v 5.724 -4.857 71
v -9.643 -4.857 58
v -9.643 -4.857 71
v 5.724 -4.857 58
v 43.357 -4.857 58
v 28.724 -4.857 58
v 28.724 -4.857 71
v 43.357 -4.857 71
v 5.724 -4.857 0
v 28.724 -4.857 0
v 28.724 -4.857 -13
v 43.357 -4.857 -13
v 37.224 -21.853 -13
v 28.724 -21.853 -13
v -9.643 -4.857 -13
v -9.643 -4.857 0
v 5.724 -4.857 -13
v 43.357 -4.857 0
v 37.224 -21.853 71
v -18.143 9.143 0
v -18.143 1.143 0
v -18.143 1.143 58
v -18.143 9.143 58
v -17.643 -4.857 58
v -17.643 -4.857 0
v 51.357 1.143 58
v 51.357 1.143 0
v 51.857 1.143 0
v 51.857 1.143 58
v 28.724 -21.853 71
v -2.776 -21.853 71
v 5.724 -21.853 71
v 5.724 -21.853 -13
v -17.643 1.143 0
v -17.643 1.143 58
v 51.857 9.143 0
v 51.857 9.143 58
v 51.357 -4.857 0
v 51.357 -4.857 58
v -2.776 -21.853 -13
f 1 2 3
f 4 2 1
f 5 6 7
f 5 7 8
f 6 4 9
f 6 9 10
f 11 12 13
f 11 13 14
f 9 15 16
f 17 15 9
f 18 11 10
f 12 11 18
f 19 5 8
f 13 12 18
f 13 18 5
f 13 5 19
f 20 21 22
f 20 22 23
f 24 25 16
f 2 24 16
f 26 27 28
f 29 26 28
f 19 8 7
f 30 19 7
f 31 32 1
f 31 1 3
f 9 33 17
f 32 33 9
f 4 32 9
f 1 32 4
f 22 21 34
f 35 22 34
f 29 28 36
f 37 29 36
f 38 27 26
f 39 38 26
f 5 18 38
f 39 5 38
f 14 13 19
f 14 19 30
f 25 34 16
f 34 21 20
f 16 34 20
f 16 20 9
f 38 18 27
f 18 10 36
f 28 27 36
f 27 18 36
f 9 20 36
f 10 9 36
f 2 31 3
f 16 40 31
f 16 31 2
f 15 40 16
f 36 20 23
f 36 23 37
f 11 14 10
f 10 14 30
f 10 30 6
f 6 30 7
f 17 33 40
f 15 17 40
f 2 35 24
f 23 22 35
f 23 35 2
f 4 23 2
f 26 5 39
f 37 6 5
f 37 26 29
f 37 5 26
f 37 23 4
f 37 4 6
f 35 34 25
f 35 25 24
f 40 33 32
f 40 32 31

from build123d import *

# Parameters (mm, degrees)
SKETCH_1_W           = 70
SKETCH_1_H           = 8
EXTRUDE_1_DEPTH      = 58
SKETCH_2_W           = 69
SKETCH_2_H           = 58
EXTRUDE_2_DEPTH      = 6
EXTRUDE_3_DEPTH      = 71
EXTRUDE_3_DEPTH_BACK = 13
CUT_EXTRUDE_2_REACH  = 103.107
SKETCH_6_W           = 23
SKETCH_6_H           = 16.995926687


with BuildPart() as part:
    # 草图1 → 凸台-拉伸1 (new body)
    with BuildSketch(Plane.XY):
        with Locations((16.857142857, 5.142857143)):
            Rectangle(SKETCH_1_W, SKETCH_1_H)
    extrude(amount=EXTRUDE_1_DEPTH)

    # 草图2 → 凸台-拉伸2 (add)
    with BuildSketch(Plane.XZ.offset(-1.142857143)):
        with Locations((16.857142857, 29)):
            Rectangle(SKETCH_2_W, SKETCH_2_H)
    extrude(amount=EXTRUDE_2_DEPTH)

    # 草图4 → 凸台-拉伸3 (add, two sides: drawn at the far end of the back side and taken through both)
    with BuildSketch(Plane.XY.offset(-EXTRUDE_3_DEPTH_BACK)):
        Polygon((-9.642857143, -4.857142857), (43.357142857, -4.857142857), (37.223942971, -21.853069544), (-2.776057029, -21.853069544), align=None)
    extrude(amount=EXTRUDE_3_DEPTH + EXTRUDE_3_DEPTH_BACK)

    # 草图6 → 切除-拉伸2 (cut, up to next)
    with BuildSketch(Plane.XY.offset(71), mode=Mode.PRIVATE) as cut_extrude_2_sk1:
        with Locations((17.223942971, -13.3551062)):
            Rectangle(SKETCH_6_W, SKETCH_6_H)
    cut_extrude_2_tool1 = extrude(cut_extrude_2_sk1.sketch, amount=-CUT_EXTRUDE_2_REACH, mode=Mode.PRIVATE) & part.part
    add(cut_extrude_2_tool1.solids().sort_by_distance((17.223943, -13.355106, 71))[0], mode=Mode.SUBTRACT)


solid = part.part
